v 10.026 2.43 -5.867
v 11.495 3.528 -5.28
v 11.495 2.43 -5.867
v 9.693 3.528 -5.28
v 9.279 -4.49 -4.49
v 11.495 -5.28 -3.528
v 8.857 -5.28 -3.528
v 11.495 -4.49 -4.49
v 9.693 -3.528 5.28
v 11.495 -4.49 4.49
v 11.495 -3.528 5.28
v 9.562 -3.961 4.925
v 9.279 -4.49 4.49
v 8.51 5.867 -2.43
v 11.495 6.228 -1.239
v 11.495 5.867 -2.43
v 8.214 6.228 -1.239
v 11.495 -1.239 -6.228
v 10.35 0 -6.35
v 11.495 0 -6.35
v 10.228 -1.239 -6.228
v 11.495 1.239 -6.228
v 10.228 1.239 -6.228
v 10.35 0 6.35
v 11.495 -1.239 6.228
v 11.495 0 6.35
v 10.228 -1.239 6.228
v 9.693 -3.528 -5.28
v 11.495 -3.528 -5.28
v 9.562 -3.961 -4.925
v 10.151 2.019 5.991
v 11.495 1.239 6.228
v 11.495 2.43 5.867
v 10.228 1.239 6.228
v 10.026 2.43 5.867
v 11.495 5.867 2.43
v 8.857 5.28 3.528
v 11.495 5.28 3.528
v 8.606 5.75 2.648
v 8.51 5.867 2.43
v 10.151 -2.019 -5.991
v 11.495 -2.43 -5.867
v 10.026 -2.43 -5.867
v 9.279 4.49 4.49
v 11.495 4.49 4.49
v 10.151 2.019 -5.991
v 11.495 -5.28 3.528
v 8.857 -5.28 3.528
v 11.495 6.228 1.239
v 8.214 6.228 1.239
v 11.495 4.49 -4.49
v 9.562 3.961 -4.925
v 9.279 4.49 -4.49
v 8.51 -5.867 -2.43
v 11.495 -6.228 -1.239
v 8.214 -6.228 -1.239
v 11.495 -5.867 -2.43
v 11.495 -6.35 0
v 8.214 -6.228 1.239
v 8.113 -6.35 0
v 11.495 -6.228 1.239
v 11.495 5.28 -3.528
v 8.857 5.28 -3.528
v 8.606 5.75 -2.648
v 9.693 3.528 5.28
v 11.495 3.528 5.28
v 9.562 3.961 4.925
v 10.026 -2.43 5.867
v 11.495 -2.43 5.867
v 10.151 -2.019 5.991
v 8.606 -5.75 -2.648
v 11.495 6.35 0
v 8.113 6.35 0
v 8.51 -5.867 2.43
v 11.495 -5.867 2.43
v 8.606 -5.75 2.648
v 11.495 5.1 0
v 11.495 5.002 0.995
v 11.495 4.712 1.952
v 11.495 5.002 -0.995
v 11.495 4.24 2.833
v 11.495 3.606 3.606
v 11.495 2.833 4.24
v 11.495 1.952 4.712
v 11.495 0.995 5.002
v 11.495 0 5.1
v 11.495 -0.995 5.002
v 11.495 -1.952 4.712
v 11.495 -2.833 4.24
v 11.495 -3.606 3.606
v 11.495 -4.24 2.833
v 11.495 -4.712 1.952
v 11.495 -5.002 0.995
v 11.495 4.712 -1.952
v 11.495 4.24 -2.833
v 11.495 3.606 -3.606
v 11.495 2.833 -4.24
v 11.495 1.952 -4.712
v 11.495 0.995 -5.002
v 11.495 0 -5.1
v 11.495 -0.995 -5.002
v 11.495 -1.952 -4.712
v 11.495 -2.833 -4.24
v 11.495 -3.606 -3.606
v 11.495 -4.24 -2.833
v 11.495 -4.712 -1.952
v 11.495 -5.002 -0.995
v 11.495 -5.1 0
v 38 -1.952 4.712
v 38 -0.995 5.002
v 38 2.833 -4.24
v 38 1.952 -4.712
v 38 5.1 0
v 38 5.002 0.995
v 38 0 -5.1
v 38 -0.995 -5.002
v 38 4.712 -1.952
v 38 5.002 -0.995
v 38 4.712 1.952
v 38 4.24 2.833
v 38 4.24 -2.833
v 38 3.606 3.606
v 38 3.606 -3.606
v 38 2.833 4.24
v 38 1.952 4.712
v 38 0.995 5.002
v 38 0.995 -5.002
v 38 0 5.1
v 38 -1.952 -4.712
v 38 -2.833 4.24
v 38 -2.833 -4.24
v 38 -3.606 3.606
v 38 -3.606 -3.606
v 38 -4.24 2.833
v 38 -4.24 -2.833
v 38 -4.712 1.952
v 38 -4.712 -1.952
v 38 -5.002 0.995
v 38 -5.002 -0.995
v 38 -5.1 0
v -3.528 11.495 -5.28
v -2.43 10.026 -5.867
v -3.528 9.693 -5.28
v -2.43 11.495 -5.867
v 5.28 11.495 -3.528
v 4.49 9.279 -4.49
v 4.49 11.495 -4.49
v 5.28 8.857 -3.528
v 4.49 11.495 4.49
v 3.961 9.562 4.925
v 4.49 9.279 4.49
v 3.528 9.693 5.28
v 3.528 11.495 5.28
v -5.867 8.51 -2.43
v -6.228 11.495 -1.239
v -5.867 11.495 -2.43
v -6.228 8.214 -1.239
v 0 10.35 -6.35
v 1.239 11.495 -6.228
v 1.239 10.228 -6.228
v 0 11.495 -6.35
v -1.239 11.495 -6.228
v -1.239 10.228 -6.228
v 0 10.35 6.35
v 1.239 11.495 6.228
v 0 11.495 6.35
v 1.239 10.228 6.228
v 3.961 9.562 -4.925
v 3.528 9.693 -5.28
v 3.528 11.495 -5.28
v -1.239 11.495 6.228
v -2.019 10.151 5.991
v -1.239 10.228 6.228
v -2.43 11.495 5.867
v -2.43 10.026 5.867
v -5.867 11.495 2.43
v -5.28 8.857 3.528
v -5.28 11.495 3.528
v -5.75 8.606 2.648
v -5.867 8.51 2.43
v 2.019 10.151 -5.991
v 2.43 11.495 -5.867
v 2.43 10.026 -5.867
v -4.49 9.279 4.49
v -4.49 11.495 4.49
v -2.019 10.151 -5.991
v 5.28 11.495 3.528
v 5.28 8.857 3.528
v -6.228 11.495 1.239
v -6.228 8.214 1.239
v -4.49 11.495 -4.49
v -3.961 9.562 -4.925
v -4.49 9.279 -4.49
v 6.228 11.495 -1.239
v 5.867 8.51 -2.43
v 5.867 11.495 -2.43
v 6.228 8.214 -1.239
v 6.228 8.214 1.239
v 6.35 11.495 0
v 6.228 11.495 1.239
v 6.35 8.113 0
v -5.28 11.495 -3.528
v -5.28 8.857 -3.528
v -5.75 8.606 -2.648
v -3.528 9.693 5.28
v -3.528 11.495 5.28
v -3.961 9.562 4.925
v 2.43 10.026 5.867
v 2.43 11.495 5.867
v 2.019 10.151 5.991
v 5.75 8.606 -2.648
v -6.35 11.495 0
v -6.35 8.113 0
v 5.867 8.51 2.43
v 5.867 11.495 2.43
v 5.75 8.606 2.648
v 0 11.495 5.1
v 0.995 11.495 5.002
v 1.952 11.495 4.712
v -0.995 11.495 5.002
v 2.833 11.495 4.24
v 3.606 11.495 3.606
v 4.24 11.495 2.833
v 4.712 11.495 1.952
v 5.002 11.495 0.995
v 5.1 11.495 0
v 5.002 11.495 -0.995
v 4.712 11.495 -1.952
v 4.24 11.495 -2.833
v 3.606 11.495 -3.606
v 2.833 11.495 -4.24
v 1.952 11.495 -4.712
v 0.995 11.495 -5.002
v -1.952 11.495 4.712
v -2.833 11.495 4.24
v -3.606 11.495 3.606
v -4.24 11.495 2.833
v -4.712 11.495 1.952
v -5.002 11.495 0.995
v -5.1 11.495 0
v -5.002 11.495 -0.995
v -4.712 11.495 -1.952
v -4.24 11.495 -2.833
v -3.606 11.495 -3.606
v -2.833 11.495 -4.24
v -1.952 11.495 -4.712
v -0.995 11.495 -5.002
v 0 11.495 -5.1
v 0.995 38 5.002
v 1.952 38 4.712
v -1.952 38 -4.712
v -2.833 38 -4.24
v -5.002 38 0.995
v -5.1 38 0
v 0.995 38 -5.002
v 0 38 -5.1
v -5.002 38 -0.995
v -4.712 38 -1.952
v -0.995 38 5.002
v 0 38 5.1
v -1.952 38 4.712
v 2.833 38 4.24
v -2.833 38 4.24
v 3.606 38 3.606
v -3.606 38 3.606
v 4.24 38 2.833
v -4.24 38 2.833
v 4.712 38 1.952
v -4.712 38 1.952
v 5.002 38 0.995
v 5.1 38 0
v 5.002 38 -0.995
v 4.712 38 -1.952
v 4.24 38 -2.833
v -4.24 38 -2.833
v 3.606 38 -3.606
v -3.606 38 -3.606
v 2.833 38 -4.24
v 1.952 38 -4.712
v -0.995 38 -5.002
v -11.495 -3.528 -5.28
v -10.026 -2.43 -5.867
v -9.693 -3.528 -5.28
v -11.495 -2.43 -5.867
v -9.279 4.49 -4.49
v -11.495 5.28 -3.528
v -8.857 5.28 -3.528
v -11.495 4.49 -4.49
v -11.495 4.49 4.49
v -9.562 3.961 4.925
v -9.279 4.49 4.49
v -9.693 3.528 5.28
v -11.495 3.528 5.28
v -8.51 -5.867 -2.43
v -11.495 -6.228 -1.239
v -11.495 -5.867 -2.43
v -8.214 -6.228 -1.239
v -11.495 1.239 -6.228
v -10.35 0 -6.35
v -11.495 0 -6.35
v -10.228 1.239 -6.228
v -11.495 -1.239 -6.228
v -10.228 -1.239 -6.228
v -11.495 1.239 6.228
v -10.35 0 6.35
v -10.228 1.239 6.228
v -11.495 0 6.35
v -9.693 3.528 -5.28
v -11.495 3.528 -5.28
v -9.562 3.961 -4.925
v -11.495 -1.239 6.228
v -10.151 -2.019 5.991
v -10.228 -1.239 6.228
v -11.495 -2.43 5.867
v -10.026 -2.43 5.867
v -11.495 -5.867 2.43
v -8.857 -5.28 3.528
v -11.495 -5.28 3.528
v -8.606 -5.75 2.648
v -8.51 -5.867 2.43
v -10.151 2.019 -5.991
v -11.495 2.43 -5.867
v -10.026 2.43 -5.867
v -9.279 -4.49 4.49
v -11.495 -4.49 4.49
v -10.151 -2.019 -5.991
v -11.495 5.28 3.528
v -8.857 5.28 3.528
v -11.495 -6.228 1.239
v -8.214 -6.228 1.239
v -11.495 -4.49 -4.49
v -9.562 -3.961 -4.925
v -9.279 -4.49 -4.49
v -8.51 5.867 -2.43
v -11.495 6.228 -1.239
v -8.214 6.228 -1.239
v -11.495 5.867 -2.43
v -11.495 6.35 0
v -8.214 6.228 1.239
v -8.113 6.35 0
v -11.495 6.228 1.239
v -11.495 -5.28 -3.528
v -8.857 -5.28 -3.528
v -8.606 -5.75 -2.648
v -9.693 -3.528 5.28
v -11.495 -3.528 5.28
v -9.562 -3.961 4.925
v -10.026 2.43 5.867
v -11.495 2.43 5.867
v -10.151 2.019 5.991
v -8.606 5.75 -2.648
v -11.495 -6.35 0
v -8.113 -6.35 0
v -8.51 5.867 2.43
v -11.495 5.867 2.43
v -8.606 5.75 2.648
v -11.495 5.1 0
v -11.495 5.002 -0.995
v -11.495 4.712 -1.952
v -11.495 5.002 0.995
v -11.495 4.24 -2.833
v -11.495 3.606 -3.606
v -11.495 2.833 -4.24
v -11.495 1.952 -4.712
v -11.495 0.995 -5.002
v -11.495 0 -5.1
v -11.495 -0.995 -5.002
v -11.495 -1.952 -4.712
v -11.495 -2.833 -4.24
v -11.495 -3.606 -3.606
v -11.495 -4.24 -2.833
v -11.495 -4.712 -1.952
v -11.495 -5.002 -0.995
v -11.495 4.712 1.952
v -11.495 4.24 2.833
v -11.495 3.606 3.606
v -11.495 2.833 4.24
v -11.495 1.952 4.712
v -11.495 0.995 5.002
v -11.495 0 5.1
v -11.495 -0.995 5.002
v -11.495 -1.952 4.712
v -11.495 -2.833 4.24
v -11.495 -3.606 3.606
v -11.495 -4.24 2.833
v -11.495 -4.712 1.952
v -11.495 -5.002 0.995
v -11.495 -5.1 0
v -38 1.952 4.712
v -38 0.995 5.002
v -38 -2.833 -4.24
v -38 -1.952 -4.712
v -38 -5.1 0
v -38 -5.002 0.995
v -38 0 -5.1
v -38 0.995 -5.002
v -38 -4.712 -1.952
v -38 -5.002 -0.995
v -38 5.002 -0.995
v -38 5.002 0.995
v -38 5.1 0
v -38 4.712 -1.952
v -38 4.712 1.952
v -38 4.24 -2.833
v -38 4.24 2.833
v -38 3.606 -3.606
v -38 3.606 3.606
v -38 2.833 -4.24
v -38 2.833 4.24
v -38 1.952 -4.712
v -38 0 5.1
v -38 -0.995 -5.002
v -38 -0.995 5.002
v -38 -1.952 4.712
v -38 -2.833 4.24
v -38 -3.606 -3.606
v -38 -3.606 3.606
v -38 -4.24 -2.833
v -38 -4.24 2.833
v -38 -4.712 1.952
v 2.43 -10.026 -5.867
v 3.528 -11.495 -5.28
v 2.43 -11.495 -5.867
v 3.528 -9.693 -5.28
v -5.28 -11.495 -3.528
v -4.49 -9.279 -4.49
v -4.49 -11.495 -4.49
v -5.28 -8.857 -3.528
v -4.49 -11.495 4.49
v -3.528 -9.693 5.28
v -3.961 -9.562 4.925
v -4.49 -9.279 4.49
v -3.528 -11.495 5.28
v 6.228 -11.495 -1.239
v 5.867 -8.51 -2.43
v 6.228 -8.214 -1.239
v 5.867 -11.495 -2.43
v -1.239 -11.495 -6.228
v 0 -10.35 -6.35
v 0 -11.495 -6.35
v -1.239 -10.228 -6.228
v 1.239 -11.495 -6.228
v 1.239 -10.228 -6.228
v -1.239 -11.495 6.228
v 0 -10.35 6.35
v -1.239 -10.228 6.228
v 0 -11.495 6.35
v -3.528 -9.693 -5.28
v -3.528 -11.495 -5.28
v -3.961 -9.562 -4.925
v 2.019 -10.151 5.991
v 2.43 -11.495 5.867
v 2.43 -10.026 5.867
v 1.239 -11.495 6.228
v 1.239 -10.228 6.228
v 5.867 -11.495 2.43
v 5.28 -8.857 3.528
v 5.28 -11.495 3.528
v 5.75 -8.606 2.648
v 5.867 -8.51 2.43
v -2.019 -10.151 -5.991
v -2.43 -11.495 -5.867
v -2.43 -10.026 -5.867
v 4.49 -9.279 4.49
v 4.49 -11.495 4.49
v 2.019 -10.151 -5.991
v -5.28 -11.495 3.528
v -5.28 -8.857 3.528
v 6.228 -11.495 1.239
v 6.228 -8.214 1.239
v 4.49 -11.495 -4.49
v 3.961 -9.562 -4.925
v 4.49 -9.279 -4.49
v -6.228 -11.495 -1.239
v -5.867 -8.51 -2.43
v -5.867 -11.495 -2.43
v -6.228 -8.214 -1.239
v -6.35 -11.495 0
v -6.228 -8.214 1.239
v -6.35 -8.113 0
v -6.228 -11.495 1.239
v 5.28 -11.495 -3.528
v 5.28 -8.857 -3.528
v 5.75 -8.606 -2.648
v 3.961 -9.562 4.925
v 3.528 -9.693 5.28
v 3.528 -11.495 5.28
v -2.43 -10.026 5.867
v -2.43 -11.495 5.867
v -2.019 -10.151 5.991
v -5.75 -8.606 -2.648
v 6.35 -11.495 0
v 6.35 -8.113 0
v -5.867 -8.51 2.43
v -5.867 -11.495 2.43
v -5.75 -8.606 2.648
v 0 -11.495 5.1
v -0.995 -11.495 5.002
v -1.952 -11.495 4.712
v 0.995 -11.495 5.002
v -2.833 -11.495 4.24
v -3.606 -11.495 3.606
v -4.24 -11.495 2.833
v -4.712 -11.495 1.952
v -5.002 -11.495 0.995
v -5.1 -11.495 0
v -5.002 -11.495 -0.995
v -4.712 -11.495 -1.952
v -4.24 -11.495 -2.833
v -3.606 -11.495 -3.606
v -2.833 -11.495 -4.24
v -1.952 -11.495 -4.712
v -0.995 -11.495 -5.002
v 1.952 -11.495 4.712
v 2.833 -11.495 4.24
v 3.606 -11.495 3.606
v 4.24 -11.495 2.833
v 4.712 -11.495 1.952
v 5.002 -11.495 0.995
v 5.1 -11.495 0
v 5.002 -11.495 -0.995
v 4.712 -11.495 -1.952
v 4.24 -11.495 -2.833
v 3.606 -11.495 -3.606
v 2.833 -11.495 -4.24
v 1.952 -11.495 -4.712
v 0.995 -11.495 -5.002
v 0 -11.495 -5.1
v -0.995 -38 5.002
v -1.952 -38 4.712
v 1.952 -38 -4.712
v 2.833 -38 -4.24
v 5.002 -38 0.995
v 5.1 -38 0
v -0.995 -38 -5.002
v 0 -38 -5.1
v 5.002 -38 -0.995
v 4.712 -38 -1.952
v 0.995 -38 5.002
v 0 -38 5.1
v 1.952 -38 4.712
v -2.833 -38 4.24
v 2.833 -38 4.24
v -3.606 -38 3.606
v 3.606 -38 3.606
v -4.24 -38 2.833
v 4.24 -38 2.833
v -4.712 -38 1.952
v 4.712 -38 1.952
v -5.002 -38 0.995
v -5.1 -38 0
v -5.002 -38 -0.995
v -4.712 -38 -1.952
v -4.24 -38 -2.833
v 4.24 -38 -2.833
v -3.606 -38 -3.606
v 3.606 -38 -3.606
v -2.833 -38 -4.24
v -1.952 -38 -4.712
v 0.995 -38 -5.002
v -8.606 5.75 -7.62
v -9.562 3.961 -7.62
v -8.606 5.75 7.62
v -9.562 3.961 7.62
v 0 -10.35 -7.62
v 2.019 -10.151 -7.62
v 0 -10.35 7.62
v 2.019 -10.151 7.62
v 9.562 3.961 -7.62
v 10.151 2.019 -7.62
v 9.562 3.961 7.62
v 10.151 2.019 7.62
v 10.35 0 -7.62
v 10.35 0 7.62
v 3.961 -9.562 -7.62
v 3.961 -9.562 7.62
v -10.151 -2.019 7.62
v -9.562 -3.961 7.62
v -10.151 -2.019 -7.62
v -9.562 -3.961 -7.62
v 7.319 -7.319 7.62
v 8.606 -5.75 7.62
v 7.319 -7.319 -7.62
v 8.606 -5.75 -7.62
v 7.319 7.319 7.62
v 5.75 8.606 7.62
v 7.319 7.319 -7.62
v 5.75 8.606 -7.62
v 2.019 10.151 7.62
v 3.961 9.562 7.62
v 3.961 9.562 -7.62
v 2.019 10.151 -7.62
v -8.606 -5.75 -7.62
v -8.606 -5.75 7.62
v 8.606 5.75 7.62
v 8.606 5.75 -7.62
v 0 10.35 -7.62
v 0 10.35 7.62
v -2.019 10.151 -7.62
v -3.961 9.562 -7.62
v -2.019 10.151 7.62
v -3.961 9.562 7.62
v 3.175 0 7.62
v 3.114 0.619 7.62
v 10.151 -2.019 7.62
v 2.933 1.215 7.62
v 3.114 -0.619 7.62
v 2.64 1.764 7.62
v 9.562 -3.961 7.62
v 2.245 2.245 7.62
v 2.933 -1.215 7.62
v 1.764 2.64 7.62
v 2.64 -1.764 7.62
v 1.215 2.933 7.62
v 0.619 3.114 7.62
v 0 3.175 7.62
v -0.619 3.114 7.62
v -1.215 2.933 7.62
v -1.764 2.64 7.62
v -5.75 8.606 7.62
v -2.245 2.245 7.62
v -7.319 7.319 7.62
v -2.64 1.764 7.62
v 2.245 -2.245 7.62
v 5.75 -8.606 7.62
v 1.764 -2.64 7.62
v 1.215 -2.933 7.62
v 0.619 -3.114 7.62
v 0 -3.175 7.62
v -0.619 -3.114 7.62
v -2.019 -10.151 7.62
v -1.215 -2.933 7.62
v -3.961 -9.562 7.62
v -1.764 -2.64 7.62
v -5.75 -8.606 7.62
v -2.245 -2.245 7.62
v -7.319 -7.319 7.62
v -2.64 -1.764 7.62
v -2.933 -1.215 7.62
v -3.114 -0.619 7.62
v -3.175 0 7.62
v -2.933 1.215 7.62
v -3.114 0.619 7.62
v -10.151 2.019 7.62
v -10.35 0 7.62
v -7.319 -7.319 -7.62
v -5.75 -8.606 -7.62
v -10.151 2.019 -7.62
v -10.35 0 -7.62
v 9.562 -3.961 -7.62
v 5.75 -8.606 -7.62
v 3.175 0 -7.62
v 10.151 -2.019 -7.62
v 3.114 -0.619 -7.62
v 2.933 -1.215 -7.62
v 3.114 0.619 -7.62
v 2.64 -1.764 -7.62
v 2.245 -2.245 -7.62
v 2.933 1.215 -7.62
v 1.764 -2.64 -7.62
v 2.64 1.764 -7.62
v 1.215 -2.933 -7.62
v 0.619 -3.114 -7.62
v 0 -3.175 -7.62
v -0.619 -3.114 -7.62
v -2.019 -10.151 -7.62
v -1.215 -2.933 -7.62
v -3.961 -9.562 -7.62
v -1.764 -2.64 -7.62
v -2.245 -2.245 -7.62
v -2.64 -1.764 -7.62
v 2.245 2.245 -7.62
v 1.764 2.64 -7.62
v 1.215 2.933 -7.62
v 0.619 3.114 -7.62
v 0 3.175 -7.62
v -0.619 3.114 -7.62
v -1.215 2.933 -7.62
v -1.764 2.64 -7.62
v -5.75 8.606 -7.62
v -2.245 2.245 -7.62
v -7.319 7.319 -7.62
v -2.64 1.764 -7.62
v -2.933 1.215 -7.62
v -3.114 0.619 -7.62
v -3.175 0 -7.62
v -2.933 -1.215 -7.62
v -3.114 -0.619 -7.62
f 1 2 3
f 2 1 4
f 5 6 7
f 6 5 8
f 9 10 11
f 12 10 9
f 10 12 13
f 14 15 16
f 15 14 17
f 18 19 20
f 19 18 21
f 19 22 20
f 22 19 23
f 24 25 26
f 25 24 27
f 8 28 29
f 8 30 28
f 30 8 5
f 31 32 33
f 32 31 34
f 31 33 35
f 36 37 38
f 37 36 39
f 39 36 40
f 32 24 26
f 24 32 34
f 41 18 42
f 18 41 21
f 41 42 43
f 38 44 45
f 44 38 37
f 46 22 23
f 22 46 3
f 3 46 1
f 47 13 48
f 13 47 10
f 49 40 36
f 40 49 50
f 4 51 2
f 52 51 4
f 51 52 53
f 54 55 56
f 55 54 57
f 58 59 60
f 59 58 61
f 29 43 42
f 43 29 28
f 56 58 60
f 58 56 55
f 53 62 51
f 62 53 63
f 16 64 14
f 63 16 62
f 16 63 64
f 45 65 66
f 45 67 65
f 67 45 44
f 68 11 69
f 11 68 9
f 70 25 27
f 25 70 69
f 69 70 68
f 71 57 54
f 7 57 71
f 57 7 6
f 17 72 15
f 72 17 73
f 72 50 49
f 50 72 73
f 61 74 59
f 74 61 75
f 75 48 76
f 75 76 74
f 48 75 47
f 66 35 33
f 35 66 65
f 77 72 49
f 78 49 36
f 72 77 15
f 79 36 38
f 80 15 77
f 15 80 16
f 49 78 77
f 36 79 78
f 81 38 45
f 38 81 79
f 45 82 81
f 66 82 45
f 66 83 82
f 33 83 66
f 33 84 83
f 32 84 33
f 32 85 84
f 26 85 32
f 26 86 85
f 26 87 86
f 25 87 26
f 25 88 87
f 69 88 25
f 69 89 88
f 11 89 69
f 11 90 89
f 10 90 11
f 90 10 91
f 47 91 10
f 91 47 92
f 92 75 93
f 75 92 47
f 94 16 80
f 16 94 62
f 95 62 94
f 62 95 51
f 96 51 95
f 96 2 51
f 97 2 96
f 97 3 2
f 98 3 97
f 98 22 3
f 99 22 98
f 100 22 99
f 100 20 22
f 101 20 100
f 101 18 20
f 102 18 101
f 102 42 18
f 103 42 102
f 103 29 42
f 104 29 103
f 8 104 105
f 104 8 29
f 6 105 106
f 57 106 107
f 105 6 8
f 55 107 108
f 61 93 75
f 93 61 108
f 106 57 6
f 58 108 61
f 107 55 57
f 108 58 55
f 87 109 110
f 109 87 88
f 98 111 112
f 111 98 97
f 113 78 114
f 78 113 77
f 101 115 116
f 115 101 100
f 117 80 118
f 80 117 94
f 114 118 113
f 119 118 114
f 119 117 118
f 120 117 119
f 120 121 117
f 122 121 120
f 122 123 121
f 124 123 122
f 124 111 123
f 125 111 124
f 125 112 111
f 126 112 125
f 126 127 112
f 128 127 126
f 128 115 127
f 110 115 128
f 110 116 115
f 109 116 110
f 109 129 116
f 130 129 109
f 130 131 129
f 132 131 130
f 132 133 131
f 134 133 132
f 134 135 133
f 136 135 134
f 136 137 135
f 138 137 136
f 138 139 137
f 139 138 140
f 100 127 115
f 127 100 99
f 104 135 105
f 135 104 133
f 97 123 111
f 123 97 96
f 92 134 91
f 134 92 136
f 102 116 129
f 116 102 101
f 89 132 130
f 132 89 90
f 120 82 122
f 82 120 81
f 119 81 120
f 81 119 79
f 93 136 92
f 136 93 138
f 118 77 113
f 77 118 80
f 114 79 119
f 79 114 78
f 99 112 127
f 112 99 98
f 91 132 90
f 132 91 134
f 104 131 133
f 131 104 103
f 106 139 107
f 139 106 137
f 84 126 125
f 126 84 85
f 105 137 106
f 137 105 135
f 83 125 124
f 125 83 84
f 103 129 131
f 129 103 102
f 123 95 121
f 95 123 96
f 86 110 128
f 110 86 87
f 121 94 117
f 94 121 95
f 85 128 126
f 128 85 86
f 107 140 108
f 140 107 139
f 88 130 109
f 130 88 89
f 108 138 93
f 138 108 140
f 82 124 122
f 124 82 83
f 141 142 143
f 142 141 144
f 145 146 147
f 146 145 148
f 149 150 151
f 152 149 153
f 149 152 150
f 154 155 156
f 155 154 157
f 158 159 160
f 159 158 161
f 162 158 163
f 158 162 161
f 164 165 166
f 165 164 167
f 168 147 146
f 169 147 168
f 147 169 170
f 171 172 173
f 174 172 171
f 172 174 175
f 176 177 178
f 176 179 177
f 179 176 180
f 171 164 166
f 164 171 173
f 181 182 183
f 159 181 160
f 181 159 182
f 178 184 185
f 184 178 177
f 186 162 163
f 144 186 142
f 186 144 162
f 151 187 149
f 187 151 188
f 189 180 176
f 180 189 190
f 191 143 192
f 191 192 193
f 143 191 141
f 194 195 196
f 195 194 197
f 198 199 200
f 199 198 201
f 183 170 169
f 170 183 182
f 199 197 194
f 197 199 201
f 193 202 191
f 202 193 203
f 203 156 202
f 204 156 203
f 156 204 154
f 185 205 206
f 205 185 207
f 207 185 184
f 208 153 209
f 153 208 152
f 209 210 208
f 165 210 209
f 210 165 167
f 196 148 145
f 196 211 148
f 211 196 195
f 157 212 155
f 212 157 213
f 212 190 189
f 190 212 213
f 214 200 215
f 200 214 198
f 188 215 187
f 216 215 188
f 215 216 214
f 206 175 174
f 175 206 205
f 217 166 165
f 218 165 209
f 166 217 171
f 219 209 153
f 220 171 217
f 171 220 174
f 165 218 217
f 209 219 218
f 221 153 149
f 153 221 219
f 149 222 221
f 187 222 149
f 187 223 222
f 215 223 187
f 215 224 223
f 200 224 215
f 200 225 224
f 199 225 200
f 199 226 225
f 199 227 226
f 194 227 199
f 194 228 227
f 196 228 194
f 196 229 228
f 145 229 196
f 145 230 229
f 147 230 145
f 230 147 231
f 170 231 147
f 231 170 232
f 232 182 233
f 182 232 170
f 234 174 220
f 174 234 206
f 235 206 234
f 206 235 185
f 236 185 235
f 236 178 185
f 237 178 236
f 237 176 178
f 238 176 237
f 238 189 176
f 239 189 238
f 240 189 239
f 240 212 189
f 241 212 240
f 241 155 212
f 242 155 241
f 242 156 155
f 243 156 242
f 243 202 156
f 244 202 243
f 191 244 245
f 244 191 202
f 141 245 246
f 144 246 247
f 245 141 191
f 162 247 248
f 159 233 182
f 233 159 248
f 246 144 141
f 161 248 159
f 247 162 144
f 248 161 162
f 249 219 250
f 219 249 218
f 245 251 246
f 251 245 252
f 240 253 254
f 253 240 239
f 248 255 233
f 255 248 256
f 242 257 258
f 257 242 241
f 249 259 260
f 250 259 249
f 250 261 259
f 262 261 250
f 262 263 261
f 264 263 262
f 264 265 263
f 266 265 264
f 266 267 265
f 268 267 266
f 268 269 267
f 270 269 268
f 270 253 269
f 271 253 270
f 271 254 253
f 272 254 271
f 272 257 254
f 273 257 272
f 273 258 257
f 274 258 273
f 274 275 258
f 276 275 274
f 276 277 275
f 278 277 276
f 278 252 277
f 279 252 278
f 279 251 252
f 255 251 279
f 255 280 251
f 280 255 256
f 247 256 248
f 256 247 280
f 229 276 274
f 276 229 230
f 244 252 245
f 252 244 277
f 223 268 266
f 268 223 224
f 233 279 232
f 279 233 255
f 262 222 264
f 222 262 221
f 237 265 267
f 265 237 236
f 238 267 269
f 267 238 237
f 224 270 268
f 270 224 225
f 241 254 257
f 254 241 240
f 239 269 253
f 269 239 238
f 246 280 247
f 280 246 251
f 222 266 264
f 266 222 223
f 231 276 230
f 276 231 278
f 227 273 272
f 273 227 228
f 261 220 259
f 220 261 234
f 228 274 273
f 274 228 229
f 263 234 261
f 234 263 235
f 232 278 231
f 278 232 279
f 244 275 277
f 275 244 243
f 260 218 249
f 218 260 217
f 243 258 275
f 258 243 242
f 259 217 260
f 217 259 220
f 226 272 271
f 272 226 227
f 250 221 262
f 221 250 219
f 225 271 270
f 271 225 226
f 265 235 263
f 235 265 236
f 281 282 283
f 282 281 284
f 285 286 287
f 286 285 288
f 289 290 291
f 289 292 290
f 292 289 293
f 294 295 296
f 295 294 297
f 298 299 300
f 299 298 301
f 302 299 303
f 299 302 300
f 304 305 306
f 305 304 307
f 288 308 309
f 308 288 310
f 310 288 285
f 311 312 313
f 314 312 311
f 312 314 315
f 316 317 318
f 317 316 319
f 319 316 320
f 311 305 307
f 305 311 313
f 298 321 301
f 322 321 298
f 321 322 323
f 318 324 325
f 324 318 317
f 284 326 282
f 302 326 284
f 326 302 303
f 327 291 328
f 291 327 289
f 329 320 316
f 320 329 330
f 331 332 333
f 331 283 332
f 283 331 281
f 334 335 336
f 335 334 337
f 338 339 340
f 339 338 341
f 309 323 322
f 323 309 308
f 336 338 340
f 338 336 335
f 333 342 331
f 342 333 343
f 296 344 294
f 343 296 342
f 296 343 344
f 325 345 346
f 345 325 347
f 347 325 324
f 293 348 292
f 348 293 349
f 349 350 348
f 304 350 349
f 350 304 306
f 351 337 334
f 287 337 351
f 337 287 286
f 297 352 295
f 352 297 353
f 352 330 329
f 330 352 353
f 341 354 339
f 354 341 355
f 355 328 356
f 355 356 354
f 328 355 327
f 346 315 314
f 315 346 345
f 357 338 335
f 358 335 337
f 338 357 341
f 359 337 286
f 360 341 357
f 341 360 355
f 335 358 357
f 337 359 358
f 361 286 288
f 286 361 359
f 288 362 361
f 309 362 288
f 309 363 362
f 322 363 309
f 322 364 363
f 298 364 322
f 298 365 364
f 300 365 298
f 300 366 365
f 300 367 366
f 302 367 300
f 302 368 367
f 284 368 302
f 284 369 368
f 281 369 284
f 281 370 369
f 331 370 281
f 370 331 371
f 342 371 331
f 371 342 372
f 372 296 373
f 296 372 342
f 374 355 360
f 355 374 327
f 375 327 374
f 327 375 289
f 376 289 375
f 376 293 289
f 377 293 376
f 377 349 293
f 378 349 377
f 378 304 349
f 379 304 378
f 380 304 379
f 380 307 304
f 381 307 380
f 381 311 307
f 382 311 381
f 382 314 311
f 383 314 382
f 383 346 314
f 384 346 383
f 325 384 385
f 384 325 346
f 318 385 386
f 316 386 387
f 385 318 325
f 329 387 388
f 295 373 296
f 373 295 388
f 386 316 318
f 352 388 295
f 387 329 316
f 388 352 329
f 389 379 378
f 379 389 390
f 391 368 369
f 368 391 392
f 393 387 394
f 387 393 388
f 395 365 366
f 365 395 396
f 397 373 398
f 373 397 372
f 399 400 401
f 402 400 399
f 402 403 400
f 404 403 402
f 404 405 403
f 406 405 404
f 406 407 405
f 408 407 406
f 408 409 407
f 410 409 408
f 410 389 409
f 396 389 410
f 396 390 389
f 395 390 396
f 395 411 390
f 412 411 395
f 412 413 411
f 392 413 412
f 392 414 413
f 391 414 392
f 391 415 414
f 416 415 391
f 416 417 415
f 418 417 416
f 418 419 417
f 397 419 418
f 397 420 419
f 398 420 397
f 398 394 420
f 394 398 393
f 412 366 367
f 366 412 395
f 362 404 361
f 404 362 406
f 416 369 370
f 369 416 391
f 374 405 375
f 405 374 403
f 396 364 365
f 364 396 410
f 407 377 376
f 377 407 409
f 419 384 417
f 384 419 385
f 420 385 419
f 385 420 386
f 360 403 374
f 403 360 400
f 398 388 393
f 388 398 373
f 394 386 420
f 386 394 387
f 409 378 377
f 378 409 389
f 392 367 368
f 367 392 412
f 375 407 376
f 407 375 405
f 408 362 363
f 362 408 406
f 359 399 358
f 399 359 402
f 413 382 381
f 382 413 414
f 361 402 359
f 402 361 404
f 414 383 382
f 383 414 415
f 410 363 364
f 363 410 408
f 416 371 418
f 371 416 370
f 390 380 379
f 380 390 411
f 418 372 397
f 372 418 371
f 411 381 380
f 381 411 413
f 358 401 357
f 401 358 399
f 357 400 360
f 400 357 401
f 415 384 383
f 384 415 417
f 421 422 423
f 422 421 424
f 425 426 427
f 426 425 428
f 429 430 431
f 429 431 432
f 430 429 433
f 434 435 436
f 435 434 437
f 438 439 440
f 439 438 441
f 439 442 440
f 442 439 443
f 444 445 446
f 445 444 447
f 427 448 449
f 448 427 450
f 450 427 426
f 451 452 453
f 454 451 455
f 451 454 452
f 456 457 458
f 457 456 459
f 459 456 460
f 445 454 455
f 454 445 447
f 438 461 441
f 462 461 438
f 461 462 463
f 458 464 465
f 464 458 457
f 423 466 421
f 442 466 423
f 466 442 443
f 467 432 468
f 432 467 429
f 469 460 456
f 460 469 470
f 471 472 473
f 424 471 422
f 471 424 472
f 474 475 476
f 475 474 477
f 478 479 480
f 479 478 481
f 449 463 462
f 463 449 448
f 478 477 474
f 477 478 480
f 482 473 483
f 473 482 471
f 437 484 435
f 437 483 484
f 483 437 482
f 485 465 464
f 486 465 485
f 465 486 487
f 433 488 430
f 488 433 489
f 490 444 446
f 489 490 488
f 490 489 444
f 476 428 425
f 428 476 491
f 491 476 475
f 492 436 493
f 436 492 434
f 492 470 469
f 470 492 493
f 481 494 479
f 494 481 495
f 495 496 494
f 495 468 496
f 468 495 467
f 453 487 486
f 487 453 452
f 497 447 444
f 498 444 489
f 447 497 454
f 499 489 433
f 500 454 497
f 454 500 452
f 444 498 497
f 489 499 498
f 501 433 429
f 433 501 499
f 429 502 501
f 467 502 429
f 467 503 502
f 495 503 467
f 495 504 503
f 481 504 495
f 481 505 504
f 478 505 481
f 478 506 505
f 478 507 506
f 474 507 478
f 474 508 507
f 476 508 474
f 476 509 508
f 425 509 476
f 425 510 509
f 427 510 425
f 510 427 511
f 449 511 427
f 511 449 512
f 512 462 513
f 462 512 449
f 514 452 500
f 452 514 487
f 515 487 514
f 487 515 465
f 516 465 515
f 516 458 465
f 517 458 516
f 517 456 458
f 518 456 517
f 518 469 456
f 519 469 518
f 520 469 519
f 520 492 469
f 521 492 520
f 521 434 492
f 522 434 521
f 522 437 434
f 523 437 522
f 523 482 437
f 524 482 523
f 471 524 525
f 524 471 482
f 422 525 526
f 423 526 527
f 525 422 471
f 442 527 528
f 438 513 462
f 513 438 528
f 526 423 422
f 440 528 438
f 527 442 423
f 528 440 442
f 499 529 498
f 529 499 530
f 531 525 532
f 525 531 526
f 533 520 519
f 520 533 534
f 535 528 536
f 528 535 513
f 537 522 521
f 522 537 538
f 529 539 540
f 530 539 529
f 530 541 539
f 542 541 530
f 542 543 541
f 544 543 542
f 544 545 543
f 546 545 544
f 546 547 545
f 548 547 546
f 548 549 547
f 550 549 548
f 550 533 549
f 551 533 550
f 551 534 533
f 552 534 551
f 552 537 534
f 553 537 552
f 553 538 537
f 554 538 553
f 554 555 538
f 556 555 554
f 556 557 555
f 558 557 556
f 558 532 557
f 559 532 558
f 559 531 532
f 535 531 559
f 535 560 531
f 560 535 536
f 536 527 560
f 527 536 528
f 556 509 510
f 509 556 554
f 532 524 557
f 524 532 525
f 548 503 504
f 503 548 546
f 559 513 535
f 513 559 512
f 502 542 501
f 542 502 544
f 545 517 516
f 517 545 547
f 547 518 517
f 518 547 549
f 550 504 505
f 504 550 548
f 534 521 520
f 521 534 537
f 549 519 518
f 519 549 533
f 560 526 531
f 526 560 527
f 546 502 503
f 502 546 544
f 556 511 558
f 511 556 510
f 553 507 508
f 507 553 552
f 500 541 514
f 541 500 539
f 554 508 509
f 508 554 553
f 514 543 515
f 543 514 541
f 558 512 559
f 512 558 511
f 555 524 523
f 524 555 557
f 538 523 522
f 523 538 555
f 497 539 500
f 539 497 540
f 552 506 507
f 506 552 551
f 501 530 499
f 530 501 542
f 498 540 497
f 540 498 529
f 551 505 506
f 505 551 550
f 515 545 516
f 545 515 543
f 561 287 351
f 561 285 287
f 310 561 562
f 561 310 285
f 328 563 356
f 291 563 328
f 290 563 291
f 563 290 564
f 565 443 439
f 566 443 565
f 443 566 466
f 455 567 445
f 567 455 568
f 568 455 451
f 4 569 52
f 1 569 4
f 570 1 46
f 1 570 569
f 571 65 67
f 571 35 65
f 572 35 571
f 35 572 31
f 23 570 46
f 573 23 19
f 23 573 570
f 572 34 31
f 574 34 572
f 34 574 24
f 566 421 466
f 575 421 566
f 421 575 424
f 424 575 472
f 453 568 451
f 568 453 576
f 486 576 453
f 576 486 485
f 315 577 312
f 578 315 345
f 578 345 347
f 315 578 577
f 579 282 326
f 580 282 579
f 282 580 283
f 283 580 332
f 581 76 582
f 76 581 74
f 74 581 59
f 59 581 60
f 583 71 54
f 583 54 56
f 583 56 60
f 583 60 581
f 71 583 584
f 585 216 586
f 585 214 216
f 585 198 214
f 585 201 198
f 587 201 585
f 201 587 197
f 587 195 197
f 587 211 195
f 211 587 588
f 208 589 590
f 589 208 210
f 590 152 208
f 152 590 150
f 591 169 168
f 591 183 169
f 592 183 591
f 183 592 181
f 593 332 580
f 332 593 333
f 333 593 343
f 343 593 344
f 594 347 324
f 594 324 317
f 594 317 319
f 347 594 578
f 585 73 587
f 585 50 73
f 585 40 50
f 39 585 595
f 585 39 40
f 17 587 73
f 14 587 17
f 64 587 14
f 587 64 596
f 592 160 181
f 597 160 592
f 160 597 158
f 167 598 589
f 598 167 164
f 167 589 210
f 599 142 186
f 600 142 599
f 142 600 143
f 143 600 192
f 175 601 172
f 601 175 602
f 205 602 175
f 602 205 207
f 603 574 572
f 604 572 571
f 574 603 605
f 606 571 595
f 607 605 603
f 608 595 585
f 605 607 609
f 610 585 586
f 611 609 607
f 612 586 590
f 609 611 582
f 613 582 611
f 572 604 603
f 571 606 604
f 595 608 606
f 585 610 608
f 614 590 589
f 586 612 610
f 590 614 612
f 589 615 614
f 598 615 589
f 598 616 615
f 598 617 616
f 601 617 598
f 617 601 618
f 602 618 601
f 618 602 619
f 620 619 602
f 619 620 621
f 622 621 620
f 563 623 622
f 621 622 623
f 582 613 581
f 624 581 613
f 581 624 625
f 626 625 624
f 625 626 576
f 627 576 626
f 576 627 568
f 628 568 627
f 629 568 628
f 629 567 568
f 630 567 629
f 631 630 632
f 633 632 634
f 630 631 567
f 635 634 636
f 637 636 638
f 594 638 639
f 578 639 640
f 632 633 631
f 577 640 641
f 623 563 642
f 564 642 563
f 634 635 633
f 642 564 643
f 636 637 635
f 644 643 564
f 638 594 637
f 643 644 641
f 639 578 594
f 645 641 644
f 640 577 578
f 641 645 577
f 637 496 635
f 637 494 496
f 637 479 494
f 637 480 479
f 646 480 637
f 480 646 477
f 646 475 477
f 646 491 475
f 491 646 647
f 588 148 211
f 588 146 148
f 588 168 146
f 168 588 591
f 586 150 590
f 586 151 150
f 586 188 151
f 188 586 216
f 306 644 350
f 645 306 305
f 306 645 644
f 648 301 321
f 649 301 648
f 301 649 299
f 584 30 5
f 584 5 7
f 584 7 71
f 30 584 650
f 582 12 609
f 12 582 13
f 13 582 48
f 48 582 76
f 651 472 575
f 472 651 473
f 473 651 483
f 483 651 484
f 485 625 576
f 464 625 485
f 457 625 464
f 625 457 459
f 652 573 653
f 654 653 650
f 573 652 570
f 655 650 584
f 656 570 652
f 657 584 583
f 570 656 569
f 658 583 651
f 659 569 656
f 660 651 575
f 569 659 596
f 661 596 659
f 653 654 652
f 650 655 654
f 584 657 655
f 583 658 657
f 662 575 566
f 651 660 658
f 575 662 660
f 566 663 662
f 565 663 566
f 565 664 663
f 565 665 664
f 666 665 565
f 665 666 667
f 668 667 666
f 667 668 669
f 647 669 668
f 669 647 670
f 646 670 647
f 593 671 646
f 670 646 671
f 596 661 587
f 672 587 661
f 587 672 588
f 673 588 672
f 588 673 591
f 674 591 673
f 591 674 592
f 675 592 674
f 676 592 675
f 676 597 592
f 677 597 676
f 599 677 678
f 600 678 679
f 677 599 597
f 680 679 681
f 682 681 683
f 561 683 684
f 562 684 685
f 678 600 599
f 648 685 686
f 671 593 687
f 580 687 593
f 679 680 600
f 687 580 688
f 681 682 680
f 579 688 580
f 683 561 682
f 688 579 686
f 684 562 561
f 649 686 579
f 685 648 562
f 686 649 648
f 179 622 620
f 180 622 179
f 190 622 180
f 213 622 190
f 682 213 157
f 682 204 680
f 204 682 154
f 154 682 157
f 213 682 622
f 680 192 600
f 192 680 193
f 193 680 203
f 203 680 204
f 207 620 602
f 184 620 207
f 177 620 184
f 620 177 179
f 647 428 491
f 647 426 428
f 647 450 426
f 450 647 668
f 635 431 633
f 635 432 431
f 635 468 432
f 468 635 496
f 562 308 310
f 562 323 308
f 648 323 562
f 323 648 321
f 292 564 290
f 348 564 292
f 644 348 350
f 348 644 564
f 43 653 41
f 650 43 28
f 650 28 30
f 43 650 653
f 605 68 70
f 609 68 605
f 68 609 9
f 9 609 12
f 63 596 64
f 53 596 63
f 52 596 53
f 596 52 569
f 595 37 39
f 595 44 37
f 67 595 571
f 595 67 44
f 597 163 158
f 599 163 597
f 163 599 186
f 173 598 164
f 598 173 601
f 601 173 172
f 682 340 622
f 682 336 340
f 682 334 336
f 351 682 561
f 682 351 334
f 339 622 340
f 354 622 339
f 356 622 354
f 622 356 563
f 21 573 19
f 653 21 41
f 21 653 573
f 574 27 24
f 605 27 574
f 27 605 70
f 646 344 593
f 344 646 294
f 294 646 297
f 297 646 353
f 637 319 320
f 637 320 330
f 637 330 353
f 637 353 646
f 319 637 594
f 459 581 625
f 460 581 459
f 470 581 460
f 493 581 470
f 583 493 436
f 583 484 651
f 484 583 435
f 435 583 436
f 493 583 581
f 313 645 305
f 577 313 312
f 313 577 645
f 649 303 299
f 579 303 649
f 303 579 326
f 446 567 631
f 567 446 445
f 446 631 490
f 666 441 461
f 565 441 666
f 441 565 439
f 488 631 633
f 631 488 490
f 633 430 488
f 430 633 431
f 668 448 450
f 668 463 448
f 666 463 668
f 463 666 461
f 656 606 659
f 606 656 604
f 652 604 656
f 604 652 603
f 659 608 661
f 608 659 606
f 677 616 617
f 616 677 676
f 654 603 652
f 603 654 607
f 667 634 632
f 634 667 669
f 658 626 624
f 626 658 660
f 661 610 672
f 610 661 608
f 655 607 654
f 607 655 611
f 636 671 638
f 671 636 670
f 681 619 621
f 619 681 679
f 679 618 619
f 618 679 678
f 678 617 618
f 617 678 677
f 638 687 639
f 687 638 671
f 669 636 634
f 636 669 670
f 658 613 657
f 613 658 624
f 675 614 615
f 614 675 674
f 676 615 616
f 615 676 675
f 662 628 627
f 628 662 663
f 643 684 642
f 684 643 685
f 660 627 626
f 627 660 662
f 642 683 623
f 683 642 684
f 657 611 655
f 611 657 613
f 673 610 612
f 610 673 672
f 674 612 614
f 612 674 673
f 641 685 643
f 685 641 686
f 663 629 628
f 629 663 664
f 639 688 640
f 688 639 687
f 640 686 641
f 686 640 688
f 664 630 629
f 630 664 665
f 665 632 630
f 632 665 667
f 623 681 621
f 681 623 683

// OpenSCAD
$fn = 32;

// ----------------------------------------------------------------------
// Cardan cross: 76 mm span, 12.7 mm trunnions
// ----------------------------------------------------------------------

// --- parameters (mm) ---
journal_d = 12.7;         // trunnion diameter
arm_len = 38;             // trunnion length from the centre
step_r = 4.32;            // step position from the centre
step_d = 10.2;            // journal diameter after the step
hub_d = 20.7;             // hub diameter
hub_h = 15.24;            // hub height
bore_d = 6.35;            // hub bore

difference() {
  union() {
    /* hub along the joint axis */
    cylinder(h = hub_h, d = hub_d, center = true);
    for (a = [0 : 90 : 270]) rotate([0, 0, a]) {
      /* trunnion, sunk into the hub */
      translate([hub_d / 4, 0, 0]) rotate([0, 90, 0]) cylinder(h = step_r + 2, d = journal_d);
      /* stepped journal out to the tip */
      translate([step_r - 0.5, 0, 0]) rotate([0, 90, 0]) cylinder(h = arm_len + 0.5 - step_r, d = step_d);
    }
  }
  /* lubrication bore through the hub, 2.5 mm clear on both sides */
  translate([0, 0, -hub_h / 2 - 2.5]) cylinder(h = hub_h + 5, d = bore_d);
}
